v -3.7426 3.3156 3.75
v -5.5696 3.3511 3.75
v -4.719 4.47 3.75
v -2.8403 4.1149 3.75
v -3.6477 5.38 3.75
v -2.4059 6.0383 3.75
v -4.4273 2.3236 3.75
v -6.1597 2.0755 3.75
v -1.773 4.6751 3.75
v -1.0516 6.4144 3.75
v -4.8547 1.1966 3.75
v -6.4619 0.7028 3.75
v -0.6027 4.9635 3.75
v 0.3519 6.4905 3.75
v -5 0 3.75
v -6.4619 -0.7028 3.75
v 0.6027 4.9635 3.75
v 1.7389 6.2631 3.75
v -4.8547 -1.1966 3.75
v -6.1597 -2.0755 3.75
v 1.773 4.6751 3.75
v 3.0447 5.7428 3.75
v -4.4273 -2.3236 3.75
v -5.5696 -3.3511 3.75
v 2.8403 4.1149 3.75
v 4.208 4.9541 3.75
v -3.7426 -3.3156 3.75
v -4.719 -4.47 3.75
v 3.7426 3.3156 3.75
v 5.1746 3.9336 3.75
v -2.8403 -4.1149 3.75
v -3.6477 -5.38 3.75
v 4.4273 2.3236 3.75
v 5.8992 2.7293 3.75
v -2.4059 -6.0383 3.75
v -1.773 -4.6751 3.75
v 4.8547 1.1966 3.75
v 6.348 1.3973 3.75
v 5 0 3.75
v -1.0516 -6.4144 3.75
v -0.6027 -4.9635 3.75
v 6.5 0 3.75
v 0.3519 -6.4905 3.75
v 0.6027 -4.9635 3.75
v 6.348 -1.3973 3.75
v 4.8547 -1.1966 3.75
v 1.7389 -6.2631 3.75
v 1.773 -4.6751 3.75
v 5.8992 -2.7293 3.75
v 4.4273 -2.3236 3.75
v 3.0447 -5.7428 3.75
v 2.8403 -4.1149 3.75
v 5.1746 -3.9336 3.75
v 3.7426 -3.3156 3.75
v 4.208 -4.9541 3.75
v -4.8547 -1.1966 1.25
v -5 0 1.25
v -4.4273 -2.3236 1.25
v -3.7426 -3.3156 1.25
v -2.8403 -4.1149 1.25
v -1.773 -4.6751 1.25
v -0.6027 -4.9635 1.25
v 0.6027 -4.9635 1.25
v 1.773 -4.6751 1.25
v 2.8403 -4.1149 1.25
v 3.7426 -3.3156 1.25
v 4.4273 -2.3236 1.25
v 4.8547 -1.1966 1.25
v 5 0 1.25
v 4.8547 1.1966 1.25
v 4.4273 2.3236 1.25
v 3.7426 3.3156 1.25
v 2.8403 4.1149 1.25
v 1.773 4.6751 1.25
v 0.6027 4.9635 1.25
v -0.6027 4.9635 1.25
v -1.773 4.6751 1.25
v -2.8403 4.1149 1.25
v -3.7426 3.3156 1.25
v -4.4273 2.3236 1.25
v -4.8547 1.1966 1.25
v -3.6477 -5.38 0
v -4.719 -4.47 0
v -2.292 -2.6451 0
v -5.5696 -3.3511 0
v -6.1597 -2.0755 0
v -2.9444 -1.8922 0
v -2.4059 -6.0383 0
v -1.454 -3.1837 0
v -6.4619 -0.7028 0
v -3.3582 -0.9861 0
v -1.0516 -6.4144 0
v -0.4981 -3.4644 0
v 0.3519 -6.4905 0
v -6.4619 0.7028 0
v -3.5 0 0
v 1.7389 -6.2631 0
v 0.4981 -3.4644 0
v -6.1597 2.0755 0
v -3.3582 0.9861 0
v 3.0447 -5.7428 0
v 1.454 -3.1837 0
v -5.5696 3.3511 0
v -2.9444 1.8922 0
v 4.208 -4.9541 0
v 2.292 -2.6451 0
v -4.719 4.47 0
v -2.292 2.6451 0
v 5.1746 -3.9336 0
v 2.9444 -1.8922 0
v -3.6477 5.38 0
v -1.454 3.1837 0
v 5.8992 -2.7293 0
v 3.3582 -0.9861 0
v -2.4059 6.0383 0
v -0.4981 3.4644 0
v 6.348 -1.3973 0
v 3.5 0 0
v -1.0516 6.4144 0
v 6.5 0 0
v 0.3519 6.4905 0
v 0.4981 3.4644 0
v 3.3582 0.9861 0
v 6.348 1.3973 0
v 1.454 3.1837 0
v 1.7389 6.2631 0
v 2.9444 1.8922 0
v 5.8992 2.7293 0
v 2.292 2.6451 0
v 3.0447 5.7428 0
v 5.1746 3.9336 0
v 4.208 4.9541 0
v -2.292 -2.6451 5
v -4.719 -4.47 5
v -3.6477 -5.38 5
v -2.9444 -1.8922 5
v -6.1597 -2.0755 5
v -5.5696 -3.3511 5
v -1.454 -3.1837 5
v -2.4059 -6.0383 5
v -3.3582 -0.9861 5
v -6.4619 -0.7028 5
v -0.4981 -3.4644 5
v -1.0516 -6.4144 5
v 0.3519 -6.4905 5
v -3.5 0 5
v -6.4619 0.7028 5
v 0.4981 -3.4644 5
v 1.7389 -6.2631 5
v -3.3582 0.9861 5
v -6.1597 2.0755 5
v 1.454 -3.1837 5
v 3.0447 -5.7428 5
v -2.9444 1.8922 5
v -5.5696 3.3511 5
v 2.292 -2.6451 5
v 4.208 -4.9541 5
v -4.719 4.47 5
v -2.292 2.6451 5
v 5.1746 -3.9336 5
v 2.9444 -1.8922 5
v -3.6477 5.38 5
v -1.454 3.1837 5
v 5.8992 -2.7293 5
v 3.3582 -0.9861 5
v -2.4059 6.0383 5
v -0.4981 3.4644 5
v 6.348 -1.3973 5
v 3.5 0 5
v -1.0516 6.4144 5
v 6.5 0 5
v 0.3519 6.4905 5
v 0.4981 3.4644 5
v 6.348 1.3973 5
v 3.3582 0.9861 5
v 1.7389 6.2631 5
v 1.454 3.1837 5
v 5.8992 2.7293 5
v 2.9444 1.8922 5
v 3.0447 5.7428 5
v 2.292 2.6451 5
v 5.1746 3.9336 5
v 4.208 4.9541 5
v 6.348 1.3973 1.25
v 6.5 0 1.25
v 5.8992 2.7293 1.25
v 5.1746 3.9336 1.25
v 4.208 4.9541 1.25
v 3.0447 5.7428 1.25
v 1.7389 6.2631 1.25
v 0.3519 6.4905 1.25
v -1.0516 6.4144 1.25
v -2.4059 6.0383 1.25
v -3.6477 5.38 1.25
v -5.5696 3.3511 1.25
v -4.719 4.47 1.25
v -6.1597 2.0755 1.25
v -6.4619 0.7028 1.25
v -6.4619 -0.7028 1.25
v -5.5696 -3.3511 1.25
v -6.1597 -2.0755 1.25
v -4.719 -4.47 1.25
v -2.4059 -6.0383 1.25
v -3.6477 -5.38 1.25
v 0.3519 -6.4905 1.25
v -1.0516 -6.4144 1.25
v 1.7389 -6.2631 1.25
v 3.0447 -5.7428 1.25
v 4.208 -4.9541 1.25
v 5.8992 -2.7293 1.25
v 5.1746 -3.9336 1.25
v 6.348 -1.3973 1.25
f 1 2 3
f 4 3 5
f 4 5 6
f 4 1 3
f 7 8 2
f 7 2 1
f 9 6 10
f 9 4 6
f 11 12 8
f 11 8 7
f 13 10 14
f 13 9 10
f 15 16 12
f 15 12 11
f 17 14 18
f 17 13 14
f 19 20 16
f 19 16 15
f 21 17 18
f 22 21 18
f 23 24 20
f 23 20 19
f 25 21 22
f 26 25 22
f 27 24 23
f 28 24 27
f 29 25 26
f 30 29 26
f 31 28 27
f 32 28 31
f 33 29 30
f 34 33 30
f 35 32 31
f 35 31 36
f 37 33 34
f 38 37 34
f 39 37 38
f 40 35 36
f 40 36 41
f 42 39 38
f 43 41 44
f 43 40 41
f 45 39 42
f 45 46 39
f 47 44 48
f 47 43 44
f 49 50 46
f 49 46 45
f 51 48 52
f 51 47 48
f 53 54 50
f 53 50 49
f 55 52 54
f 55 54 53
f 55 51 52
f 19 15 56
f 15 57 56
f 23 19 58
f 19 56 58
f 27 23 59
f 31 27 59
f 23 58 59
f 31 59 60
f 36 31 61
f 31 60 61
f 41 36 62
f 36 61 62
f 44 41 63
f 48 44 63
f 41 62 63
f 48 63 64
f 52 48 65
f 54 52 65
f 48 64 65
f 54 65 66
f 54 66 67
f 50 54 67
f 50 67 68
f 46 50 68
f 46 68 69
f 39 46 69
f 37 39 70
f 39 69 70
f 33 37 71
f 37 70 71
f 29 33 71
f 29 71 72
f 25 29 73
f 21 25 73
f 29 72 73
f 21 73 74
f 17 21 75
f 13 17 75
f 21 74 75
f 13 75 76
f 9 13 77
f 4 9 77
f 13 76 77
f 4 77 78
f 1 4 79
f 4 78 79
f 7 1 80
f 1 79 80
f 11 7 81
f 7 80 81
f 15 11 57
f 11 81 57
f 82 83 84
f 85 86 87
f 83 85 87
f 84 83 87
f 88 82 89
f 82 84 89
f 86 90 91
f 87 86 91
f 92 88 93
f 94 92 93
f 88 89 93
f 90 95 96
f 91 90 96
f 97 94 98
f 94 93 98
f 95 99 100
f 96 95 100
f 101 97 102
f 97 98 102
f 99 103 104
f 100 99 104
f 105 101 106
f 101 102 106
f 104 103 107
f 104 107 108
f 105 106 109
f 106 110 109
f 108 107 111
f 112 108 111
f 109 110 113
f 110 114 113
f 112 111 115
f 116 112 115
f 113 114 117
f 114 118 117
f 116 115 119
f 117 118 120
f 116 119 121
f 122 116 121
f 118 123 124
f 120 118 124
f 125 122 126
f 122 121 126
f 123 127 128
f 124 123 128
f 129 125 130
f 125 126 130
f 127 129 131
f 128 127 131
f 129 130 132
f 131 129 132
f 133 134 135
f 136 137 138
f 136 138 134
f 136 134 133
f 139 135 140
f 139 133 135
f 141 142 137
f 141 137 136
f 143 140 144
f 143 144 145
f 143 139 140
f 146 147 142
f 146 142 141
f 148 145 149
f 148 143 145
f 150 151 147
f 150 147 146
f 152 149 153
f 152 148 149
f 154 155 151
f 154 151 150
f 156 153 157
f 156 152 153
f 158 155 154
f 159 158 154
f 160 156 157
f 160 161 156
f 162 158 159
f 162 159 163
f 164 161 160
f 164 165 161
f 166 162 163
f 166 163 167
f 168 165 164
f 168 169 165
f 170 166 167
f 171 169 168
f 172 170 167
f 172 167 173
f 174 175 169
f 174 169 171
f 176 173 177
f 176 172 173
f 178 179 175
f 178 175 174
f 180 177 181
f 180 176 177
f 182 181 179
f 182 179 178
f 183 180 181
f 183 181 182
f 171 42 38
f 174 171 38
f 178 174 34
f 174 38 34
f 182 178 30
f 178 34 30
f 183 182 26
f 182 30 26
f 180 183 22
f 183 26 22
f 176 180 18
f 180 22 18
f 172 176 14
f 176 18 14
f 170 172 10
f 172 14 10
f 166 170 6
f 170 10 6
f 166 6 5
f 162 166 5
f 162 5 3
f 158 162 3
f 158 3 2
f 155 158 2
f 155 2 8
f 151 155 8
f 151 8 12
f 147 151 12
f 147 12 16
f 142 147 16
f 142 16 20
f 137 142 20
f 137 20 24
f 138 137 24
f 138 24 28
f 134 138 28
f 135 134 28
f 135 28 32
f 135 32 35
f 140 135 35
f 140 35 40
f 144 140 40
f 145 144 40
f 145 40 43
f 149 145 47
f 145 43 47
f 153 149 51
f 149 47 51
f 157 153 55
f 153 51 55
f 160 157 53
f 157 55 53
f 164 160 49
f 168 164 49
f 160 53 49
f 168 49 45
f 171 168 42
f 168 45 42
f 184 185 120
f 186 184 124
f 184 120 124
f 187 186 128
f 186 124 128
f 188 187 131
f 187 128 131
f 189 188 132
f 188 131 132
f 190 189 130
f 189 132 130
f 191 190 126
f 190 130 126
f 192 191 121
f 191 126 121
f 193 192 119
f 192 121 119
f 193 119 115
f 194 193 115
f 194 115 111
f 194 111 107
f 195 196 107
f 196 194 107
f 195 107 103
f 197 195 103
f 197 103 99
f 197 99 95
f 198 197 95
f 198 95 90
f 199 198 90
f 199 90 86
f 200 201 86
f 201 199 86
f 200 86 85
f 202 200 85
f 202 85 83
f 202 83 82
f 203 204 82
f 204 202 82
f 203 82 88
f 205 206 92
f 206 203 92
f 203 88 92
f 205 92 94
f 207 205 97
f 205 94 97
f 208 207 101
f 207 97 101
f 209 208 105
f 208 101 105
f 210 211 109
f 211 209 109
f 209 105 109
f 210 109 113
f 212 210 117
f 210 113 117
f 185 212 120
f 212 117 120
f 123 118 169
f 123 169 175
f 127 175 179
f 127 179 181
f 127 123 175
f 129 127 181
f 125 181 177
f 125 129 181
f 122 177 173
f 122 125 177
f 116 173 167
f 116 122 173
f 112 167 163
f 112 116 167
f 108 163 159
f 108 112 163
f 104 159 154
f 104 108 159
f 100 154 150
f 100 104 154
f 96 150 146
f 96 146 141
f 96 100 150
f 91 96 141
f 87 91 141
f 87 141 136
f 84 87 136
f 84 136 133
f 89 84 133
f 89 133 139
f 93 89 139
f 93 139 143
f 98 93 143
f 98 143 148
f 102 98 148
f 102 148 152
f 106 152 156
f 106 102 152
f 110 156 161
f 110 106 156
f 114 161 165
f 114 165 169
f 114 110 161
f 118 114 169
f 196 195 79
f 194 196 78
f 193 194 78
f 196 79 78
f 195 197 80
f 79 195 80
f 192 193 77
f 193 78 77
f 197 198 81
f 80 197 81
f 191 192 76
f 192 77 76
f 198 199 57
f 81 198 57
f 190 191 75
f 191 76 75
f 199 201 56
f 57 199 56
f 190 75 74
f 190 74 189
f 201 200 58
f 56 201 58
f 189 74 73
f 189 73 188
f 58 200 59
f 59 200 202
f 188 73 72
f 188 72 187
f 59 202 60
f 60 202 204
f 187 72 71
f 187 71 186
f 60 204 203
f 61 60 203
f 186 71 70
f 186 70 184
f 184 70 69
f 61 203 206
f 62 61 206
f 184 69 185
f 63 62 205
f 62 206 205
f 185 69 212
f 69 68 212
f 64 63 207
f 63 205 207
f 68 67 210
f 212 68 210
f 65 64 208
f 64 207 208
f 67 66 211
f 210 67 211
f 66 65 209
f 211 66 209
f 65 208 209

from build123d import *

# Parameters (mm, degrees)
ESQUISSE1_R        = 6.5
ESQUISSE1_R_2      = 3.5
BOSS_EXTRU_1_DEPTH = 5
ESQUISSE2_W        = 1.5
ESQUISSE2_H        = 2.5


with BuildPart() as part:
    # Esquisse1 → Boss.-Extru.1 (new body)
    with BuildSketch(Plane.XY):
        Circle(ESQUISSE1_R)
        Circle(ESQUISSE1_R_2, mode=Mode.SUBTRACT)
    extrude(amount=BOSS_EXTRU_1_DEPTH)

    # Esquisse2 → Enlèvement de matière-Révolution1 (revolve, cut)
    with BuildSketch(Plane(origin=(0, 0, 0), x_dir=(1, 0, 0), z_dir=(0, 1, 0)), mode=Mode.PRIVATE) as enl_vement_de_mati_re_r_volution1_sk:
        with Locations((5.75, -2.5)):
            Rectangle(ESQUISSE2_W, ESQUISSE2_H)
    revolve(enl_vement_de_mati_re_r_volution1_sk.sketch.rotate(Axis((0, 0, -1.624351993), (0, 0, 1)), 180), axis=Axis((0, 0, -1.624351993), (0, 0, 1)), mode=Mode.SUBTRACT)


solid = part.part
